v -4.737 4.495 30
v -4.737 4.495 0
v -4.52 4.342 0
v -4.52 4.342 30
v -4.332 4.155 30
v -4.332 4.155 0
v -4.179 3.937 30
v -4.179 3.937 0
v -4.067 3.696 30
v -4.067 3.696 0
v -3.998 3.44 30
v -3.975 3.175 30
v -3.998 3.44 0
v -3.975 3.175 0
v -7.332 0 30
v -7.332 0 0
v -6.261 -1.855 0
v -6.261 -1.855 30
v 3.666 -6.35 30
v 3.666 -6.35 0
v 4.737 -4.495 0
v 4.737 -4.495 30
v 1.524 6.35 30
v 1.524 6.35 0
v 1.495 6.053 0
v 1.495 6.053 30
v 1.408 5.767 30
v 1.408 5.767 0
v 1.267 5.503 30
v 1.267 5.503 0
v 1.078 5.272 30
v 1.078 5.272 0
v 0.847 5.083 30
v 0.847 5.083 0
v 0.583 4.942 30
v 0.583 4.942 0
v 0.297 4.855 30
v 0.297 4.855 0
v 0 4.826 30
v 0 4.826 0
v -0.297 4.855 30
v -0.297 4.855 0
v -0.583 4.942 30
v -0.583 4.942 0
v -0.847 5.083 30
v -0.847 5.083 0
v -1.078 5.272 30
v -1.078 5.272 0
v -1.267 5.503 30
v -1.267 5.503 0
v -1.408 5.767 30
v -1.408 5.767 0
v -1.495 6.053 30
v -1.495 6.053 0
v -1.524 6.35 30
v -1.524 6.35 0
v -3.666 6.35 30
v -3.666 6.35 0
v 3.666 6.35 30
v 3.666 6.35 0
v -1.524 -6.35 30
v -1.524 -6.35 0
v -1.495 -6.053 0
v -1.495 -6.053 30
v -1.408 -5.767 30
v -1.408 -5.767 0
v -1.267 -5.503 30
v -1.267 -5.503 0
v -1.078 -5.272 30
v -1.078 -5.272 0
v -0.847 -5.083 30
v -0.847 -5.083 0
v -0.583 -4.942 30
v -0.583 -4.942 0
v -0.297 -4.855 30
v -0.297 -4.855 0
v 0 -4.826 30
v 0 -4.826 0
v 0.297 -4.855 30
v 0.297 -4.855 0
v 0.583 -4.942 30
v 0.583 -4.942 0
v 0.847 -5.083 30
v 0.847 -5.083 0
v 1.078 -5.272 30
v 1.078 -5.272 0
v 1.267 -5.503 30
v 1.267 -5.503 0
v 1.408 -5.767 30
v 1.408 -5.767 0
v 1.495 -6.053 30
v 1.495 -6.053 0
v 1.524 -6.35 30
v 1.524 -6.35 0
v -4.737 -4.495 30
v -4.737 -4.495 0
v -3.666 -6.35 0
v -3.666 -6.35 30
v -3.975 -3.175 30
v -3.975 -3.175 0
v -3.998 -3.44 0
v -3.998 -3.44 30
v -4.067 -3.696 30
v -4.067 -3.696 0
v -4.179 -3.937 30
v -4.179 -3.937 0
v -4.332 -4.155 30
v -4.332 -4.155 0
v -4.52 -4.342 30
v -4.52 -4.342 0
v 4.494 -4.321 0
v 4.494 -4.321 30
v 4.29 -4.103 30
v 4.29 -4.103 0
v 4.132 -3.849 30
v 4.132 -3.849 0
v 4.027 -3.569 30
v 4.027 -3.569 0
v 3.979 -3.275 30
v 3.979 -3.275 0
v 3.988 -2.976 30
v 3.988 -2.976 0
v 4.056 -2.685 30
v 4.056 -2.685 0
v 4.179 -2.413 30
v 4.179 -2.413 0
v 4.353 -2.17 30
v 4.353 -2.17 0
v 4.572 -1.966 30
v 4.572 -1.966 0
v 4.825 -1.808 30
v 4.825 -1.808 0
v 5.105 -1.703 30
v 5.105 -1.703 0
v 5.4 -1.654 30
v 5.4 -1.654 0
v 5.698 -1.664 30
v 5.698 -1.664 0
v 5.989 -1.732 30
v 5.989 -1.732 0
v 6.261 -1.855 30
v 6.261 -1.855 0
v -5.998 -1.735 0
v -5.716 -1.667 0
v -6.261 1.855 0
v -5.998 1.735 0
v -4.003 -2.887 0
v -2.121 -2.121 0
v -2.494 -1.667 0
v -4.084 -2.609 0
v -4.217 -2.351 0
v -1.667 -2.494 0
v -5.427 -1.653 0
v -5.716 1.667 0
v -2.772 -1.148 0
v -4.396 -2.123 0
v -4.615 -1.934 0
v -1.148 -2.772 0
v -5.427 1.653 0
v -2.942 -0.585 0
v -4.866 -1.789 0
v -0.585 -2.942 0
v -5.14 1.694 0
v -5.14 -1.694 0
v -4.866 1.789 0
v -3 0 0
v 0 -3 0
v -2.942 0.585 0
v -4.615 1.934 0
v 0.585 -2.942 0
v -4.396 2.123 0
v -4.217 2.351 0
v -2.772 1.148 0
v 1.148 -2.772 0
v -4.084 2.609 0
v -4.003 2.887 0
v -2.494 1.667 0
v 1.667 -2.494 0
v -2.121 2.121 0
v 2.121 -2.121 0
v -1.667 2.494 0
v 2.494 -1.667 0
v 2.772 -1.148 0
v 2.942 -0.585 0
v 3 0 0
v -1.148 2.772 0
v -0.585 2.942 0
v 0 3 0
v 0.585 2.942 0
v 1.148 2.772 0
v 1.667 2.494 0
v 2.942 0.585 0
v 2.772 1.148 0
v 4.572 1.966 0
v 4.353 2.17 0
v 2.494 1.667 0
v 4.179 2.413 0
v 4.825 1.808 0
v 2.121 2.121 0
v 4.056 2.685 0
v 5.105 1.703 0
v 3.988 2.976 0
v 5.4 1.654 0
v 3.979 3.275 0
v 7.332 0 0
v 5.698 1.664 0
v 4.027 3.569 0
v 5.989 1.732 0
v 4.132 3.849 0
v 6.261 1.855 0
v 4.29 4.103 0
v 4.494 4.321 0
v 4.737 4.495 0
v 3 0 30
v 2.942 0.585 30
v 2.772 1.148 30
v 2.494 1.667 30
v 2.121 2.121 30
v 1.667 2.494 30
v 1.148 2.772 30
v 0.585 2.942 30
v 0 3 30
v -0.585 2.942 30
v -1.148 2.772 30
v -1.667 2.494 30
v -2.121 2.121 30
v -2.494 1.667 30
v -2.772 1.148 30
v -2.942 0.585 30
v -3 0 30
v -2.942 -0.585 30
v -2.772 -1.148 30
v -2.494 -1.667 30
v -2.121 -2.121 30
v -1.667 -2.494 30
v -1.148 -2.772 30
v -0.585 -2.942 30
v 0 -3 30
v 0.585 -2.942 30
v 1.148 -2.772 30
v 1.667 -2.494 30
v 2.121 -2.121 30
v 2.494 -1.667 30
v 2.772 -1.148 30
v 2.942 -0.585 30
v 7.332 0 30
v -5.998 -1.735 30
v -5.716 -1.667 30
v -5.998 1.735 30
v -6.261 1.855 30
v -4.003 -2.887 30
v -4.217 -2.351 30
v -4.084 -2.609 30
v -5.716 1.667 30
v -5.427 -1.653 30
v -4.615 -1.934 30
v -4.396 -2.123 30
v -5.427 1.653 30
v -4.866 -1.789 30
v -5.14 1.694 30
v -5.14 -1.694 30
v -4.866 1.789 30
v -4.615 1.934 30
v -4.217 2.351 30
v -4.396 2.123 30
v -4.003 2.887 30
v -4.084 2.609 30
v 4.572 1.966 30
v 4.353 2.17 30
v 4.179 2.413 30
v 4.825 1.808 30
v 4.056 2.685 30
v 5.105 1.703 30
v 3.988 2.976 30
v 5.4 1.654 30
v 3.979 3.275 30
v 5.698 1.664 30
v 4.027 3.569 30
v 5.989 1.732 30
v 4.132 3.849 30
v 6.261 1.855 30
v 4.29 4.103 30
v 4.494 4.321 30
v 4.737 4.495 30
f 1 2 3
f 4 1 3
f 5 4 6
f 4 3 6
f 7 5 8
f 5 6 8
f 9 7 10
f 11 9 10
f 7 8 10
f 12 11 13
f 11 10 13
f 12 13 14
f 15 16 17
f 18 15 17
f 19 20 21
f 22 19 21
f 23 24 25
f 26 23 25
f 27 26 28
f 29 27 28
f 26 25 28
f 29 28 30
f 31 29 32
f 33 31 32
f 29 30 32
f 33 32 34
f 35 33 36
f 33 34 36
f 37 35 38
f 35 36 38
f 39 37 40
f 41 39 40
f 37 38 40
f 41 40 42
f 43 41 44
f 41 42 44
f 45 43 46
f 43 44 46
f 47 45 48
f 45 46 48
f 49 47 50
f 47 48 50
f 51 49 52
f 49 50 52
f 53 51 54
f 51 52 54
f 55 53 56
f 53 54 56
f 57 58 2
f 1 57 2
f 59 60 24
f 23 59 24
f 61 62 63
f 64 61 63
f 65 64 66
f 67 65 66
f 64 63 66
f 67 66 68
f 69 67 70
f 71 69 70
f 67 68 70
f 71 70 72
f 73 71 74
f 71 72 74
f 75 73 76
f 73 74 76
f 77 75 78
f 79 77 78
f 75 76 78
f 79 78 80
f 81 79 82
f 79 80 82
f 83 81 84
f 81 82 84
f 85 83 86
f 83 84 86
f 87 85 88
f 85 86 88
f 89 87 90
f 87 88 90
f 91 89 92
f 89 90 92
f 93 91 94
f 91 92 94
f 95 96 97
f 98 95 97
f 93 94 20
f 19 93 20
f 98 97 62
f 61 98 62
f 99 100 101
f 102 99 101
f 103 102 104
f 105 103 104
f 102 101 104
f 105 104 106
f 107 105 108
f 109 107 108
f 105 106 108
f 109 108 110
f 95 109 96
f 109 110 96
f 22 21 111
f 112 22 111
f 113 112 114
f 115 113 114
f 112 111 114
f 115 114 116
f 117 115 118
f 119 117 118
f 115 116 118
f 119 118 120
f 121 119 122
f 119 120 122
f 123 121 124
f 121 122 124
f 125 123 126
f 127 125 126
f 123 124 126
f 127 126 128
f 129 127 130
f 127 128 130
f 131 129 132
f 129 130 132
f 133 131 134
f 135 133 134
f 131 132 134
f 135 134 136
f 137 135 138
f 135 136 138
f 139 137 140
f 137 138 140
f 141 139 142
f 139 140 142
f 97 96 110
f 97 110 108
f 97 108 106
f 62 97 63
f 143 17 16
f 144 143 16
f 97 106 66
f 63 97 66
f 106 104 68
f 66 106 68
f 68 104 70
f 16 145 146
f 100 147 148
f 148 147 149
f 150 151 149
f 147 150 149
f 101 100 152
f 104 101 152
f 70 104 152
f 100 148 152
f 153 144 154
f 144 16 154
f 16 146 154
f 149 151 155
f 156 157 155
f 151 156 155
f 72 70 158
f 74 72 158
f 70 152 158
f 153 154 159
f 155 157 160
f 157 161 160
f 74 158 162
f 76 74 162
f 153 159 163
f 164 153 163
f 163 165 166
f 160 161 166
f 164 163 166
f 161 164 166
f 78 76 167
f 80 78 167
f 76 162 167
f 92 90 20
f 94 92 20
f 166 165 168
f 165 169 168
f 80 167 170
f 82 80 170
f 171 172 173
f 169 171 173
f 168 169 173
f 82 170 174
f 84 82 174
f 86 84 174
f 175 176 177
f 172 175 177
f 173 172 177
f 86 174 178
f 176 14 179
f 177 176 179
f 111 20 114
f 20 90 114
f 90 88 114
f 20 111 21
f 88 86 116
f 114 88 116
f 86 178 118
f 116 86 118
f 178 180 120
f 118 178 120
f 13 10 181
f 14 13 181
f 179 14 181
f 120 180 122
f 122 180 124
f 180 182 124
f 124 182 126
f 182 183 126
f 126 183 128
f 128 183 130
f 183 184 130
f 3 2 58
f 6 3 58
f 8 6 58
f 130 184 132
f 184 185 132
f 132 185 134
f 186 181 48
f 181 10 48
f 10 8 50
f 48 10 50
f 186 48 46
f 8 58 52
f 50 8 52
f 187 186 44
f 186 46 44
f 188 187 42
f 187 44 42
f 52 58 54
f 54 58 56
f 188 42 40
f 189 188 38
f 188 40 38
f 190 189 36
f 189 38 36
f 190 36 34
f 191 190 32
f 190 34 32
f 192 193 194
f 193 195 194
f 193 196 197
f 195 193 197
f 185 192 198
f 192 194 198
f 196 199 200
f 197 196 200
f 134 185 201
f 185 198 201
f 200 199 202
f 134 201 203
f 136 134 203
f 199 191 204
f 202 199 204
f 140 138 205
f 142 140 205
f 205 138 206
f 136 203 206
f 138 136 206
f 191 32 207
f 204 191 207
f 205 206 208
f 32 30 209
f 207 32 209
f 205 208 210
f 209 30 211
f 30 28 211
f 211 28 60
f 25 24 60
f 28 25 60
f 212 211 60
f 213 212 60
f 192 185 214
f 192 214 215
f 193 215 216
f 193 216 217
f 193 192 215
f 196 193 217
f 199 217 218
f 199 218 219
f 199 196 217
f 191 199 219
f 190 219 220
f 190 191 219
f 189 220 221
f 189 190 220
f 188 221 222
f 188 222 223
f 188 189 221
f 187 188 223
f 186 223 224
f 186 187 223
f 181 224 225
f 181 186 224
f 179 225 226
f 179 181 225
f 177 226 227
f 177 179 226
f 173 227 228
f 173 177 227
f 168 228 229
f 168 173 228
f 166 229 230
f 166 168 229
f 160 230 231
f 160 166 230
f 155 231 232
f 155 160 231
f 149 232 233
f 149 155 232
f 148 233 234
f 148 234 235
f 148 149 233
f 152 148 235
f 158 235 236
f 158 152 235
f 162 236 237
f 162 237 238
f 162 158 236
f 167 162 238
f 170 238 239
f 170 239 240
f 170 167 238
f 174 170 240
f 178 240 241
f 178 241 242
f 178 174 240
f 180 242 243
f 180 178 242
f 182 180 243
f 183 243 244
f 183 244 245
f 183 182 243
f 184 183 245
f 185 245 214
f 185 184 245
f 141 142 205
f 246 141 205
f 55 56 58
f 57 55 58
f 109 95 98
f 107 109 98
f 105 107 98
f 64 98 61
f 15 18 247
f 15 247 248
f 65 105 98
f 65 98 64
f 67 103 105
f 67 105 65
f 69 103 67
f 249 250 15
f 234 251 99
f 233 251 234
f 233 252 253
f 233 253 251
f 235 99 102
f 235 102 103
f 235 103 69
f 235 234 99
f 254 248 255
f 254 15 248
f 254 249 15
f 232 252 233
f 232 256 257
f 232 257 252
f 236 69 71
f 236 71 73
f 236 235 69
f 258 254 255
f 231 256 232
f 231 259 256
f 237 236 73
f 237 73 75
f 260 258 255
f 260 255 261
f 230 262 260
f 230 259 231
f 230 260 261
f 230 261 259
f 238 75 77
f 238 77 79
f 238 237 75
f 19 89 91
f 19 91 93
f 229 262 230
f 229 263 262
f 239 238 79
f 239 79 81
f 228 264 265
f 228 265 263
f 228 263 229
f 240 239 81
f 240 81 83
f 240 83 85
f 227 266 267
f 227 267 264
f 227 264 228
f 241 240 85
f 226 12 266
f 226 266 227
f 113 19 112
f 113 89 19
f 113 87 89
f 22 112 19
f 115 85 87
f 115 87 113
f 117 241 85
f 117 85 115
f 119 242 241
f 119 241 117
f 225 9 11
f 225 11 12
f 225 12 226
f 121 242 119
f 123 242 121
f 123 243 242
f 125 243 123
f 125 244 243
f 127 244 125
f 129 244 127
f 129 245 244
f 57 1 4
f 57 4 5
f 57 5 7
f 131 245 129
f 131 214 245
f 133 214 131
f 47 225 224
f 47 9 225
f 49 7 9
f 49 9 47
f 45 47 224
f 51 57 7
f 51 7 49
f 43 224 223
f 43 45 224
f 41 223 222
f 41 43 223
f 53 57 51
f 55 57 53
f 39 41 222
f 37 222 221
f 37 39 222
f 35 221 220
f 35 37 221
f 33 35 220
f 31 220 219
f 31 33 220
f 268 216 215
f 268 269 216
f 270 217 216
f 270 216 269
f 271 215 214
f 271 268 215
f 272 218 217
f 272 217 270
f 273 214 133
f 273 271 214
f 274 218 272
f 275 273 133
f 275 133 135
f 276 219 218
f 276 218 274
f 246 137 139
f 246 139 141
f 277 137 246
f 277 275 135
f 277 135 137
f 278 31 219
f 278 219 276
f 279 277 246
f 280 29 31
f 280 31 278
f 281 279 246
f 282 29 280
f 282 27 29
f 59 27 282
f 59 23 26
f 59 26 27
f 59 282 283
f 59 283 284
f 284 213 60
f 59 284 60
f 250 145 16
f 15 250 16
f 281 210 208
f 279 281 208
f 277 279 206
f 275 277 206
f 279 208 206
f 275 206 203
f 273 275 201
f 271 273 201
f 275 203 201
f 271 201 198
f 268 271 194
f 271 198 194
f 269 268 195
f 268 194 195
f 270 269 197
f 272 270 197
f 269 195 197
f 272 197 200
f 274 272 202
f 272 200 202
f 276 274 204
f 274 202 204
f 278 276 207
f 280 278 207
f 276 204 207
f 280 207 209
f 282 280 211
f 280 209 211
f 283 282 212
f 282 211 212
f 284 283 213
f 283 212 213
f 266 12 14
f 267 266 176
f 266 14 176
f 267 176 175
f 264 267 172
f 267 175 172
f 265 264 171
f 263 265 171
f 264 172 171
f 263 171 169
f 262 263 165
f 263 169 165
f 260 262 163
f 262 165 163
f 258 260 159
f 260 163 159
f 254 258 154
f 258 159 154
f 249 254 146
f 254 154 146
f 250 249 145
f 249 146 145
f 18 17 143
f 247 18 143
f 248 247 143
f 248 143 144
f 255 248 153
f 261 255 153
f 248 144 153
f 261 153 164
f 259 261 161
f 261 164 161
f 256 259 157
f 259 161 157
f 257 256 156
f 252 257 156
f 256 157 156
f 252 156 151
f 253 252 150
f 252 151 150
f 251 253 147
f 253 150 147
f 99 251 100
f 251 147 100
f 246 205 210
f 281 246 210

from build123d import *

# Parameters (mm, degrees)
ESBO_O1_R                = 3
RESSALTO_EXTRUS_O1_DEPTH = 30


with BuildPart() as part:
    # Esboço1 → Ressalto-extrusão1 (new body)
    with BuildSketch(Plane.XY):
        with BuildLine():
            Line((4.737261314, 4.494822715), (3.666174209, 6.35))
            Line((3.666174209, 6.35), (1.524, 6.35))
            ThreePointArc((1.524, 6.35), (0, 4.826), (-1.524, 6.35))
            Line((-1.524, 6.35), (-3.666174209, 6.35))
            Line((-3.666174209, 6.35), (-4.737261314, 4.494822715))
            ThreePointArc((-4.737261314, 4.494822715), (-4.179438599, 3.937), (-3.975261314, 3.175))
            ThreePointArc((-3.975261314, 3.175), (-4.737261314, 1.855177285), (-6.261261314, 1.855177285))
            Line((-6.261261314, 1.855177285), (-7.332348419, 0))
            Line((-7.332348419, 0), (-6.261261314, -1.855177285))
            ThreePointArc((-6.261261314, -1.855177285), (-4.737261314, -1.855177285), (-3.975261314, -3.175))
            ThreePointArc((-3.975261314, -3.175), (-4.179438599, -3.937), (-4.737261314, -4.494822715))
            Line((-4.737261314, -4.494822715), (-3.666174209, -6.35))
            Line((-3.666174209, -6.35), (-1.524, -6.35))
            ThreePointArc((-1.524, -6.35), (0, -4.826), (1.524, -6.35))
            Line((1.524, -6.35), (3.666174209, -6.35))
            Line((3.666174209, -6.35), (4.737261314, -4.494822715))
            ThreePointArc((4.737261314, -4.494822715), (4.179438599, -2.413), (6.261261314, -1.855177285))
            Line((6.261261314, -1.855177285), (7.332348419, 0))
            Line((7.332348419, 0), (6.261261314, 1.855177285))
            ThreePointArc((6.261261314, 1.855177285), (4.179438599, 2.413), (4.737261314, 4.494822715))
        make_face()
        Circle(ESBO_O1_R, mode=Mode.SUBTRACT)
    extrude(amount=RESSALTO_EXTRUS_O1_DEPTH)


solid = part.part
